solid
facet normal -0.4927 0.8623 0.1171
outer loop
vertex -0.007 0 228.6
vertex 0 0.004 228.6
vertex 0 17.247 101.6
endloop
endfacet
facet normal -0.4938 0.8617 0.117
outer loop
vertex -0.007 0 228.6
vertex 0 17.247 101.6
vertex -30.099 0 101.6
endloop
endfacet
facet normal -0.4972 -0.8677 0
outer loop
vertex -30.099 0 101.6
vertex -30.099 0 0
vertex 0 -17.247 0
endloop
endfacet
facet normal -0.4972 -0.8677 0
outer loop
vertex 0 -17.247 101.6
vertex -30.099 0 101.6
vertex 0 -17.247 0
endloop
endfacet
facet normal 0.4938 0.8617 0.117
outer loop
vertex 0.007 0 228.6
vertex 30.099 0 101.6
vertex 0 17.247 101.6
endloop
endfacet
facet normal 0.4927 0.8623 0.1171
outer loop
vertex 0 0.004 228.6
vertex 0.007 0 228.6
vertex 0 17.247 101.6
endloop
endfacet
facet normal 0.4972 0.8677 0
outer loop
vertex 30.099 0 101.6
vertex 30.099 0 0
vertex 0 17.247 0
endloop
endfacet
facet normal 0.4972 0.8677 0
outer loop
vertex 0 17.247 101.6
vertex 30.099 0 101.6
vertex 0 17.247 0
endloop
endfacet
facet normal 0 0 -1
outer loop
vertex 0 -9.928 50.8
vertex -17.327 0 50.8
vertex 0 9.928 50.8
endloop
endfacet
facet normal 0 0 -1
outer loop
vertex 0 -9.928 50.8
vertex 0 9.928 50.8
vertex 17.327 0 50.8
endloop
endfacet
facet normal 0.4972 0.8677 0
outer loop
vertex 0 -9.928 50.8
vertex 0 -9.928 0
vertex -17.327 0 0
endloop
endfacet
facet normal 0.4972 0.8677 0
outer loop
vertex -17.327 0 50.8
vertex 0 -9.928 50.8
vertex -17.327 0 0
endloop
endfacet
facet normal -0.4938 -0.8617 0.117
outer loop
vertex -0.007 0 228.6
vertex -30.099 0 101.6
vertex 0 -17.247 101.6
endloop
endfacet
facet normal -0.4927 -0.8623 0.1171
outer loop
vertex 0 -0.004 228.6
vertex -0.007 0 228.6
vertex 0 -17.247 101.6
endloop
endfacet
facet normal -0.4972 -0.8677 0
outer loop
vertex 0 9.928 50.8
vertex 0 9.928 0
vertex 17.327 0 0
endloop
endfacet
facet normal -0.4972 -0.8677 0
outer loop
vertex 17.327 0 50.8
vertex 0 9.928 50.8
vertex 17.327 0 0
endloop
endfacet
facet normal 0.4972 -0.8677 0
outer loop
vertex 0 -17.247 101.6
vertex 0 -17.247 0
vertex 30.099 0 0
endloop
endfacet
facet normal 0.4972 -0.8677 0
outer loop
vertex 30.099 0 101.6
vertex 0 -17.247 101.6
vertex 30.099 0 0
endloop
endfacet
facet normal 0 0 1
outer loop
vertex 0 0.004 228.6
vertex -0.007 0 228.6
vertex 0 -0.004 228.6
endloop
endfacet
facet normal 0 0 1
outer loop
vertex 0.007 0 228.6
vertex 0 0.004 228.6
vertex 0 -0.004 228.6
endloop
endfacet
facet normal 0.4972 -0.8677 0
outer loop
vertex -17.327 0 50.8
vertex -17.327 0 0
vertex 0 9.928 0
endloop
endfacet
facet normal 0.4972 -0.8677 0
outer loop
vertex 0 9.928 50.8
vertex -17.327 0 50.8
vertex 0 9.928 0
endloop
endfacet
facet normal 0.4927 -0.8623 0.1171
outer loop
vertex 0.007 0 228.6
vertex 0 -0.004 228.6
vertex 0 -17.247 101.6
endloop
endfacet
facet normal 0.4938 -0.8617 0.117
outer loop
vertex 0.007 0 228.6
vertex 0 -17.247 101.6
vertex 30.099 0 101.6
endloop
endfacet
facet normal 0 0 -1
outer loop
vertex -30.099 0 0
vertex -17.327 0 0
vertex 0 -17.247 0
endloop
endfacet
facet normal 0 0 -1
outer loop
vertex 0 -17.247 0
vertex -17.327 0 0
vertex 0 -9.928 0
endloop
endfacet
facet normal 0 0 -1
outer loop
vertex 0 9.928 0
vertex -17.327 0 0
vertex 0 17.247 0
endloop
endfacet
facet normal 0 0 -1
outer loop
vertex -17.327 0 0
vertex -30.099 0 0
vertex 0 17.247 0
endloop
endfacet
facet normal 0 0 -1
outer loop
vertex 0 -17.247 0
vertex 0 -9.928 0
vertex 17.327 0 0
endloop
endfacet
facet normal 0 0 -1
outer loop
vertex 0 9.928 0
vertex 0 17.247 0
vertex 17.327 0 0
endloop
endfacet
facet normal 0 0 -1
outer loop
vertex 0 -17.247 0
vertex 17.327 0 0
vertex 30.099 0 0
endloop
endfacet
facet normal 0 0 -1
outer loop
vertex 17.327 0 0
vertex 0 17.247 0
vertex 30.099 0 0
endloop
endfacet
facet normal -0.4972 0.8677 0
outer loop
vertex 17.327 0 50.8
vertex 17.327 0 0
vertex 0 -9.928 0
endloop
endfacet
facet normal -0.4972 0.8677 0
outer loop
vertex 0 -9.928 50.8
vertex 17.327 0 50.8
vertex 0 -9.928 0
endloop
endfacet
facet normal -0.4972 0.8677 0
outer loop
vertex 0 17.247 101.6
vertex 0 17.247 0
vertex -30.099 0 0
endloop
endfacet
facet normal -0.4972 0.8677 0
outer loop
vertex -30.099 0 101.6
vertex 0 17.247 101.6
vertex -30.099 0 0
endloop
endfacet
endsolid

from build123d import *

# Parameters (mm, degrees)
F1_DEPTH = 50.8
F3_DEPTH = 177.8
F4_SIZE2 = 127
F4_SIZE  = 14.96059746


with BuildPart() as f1:
    # F0 (on Top) → F1 (new body)
    with BuildSketch(Plane.XY):
        Polygon((0, 17.2466), (0, 9.9280379058), (17.3265462716, 0), (30.099, 0), align=None)
        Polygon((-30.099, 0), (-17.3265462716, 0), (0, 9.9280379058), (0, 17.2466), align=None)
        Polygon((0, -9.9280379058), (-17.3265462716, 0), (-30.099, 0), (0, -17.2466), align=None)
        Polygon((30.099, 0), (17.3265462716, 0), (0, -9.9280379058), (0, -17.2466), align=None)
    extrude(amount=F1_DEPTH)

    # F2 (on face) → F3 (join)
    with BuildSketch(Plane.XY.offset(50.8)):
        Polygon((0, -17.2466), (30.099, 0), (0, 17.2466), (-30.099, 0), align=None)
        Polygon((-17.3265462716, 0), (0, 9.9280379058), (17.3265462716, 0), (0, -9.9280379058), align=None, mode=Mode.SUBTRACT)
        Polygon((17.3265462716, 0), (0, 9.9280379058), (-17.3265462716, 0), (0, -9.9280379058), align=None)
    extrude(amount=F3_DEPTH)

    # F4
    f4_edges = [f1.edges().sort_by_distance(p)[0] for p in [
        (15.0495, -8.6233, 228.6),
        (15.0495, 8.6233, 228.6),
        (-15.0495, 8.6233, 228.6),
        (-15.0495, -8.6233, 228.6),
    ]]
    f4_side = f1.faces().sort_by_distance((0, 0, 228.6))[0]
    chamfer(f4_edges, length=F4_SIZE, length2=F4_SIZE2, reference=f4_side)


solid = f1.part
